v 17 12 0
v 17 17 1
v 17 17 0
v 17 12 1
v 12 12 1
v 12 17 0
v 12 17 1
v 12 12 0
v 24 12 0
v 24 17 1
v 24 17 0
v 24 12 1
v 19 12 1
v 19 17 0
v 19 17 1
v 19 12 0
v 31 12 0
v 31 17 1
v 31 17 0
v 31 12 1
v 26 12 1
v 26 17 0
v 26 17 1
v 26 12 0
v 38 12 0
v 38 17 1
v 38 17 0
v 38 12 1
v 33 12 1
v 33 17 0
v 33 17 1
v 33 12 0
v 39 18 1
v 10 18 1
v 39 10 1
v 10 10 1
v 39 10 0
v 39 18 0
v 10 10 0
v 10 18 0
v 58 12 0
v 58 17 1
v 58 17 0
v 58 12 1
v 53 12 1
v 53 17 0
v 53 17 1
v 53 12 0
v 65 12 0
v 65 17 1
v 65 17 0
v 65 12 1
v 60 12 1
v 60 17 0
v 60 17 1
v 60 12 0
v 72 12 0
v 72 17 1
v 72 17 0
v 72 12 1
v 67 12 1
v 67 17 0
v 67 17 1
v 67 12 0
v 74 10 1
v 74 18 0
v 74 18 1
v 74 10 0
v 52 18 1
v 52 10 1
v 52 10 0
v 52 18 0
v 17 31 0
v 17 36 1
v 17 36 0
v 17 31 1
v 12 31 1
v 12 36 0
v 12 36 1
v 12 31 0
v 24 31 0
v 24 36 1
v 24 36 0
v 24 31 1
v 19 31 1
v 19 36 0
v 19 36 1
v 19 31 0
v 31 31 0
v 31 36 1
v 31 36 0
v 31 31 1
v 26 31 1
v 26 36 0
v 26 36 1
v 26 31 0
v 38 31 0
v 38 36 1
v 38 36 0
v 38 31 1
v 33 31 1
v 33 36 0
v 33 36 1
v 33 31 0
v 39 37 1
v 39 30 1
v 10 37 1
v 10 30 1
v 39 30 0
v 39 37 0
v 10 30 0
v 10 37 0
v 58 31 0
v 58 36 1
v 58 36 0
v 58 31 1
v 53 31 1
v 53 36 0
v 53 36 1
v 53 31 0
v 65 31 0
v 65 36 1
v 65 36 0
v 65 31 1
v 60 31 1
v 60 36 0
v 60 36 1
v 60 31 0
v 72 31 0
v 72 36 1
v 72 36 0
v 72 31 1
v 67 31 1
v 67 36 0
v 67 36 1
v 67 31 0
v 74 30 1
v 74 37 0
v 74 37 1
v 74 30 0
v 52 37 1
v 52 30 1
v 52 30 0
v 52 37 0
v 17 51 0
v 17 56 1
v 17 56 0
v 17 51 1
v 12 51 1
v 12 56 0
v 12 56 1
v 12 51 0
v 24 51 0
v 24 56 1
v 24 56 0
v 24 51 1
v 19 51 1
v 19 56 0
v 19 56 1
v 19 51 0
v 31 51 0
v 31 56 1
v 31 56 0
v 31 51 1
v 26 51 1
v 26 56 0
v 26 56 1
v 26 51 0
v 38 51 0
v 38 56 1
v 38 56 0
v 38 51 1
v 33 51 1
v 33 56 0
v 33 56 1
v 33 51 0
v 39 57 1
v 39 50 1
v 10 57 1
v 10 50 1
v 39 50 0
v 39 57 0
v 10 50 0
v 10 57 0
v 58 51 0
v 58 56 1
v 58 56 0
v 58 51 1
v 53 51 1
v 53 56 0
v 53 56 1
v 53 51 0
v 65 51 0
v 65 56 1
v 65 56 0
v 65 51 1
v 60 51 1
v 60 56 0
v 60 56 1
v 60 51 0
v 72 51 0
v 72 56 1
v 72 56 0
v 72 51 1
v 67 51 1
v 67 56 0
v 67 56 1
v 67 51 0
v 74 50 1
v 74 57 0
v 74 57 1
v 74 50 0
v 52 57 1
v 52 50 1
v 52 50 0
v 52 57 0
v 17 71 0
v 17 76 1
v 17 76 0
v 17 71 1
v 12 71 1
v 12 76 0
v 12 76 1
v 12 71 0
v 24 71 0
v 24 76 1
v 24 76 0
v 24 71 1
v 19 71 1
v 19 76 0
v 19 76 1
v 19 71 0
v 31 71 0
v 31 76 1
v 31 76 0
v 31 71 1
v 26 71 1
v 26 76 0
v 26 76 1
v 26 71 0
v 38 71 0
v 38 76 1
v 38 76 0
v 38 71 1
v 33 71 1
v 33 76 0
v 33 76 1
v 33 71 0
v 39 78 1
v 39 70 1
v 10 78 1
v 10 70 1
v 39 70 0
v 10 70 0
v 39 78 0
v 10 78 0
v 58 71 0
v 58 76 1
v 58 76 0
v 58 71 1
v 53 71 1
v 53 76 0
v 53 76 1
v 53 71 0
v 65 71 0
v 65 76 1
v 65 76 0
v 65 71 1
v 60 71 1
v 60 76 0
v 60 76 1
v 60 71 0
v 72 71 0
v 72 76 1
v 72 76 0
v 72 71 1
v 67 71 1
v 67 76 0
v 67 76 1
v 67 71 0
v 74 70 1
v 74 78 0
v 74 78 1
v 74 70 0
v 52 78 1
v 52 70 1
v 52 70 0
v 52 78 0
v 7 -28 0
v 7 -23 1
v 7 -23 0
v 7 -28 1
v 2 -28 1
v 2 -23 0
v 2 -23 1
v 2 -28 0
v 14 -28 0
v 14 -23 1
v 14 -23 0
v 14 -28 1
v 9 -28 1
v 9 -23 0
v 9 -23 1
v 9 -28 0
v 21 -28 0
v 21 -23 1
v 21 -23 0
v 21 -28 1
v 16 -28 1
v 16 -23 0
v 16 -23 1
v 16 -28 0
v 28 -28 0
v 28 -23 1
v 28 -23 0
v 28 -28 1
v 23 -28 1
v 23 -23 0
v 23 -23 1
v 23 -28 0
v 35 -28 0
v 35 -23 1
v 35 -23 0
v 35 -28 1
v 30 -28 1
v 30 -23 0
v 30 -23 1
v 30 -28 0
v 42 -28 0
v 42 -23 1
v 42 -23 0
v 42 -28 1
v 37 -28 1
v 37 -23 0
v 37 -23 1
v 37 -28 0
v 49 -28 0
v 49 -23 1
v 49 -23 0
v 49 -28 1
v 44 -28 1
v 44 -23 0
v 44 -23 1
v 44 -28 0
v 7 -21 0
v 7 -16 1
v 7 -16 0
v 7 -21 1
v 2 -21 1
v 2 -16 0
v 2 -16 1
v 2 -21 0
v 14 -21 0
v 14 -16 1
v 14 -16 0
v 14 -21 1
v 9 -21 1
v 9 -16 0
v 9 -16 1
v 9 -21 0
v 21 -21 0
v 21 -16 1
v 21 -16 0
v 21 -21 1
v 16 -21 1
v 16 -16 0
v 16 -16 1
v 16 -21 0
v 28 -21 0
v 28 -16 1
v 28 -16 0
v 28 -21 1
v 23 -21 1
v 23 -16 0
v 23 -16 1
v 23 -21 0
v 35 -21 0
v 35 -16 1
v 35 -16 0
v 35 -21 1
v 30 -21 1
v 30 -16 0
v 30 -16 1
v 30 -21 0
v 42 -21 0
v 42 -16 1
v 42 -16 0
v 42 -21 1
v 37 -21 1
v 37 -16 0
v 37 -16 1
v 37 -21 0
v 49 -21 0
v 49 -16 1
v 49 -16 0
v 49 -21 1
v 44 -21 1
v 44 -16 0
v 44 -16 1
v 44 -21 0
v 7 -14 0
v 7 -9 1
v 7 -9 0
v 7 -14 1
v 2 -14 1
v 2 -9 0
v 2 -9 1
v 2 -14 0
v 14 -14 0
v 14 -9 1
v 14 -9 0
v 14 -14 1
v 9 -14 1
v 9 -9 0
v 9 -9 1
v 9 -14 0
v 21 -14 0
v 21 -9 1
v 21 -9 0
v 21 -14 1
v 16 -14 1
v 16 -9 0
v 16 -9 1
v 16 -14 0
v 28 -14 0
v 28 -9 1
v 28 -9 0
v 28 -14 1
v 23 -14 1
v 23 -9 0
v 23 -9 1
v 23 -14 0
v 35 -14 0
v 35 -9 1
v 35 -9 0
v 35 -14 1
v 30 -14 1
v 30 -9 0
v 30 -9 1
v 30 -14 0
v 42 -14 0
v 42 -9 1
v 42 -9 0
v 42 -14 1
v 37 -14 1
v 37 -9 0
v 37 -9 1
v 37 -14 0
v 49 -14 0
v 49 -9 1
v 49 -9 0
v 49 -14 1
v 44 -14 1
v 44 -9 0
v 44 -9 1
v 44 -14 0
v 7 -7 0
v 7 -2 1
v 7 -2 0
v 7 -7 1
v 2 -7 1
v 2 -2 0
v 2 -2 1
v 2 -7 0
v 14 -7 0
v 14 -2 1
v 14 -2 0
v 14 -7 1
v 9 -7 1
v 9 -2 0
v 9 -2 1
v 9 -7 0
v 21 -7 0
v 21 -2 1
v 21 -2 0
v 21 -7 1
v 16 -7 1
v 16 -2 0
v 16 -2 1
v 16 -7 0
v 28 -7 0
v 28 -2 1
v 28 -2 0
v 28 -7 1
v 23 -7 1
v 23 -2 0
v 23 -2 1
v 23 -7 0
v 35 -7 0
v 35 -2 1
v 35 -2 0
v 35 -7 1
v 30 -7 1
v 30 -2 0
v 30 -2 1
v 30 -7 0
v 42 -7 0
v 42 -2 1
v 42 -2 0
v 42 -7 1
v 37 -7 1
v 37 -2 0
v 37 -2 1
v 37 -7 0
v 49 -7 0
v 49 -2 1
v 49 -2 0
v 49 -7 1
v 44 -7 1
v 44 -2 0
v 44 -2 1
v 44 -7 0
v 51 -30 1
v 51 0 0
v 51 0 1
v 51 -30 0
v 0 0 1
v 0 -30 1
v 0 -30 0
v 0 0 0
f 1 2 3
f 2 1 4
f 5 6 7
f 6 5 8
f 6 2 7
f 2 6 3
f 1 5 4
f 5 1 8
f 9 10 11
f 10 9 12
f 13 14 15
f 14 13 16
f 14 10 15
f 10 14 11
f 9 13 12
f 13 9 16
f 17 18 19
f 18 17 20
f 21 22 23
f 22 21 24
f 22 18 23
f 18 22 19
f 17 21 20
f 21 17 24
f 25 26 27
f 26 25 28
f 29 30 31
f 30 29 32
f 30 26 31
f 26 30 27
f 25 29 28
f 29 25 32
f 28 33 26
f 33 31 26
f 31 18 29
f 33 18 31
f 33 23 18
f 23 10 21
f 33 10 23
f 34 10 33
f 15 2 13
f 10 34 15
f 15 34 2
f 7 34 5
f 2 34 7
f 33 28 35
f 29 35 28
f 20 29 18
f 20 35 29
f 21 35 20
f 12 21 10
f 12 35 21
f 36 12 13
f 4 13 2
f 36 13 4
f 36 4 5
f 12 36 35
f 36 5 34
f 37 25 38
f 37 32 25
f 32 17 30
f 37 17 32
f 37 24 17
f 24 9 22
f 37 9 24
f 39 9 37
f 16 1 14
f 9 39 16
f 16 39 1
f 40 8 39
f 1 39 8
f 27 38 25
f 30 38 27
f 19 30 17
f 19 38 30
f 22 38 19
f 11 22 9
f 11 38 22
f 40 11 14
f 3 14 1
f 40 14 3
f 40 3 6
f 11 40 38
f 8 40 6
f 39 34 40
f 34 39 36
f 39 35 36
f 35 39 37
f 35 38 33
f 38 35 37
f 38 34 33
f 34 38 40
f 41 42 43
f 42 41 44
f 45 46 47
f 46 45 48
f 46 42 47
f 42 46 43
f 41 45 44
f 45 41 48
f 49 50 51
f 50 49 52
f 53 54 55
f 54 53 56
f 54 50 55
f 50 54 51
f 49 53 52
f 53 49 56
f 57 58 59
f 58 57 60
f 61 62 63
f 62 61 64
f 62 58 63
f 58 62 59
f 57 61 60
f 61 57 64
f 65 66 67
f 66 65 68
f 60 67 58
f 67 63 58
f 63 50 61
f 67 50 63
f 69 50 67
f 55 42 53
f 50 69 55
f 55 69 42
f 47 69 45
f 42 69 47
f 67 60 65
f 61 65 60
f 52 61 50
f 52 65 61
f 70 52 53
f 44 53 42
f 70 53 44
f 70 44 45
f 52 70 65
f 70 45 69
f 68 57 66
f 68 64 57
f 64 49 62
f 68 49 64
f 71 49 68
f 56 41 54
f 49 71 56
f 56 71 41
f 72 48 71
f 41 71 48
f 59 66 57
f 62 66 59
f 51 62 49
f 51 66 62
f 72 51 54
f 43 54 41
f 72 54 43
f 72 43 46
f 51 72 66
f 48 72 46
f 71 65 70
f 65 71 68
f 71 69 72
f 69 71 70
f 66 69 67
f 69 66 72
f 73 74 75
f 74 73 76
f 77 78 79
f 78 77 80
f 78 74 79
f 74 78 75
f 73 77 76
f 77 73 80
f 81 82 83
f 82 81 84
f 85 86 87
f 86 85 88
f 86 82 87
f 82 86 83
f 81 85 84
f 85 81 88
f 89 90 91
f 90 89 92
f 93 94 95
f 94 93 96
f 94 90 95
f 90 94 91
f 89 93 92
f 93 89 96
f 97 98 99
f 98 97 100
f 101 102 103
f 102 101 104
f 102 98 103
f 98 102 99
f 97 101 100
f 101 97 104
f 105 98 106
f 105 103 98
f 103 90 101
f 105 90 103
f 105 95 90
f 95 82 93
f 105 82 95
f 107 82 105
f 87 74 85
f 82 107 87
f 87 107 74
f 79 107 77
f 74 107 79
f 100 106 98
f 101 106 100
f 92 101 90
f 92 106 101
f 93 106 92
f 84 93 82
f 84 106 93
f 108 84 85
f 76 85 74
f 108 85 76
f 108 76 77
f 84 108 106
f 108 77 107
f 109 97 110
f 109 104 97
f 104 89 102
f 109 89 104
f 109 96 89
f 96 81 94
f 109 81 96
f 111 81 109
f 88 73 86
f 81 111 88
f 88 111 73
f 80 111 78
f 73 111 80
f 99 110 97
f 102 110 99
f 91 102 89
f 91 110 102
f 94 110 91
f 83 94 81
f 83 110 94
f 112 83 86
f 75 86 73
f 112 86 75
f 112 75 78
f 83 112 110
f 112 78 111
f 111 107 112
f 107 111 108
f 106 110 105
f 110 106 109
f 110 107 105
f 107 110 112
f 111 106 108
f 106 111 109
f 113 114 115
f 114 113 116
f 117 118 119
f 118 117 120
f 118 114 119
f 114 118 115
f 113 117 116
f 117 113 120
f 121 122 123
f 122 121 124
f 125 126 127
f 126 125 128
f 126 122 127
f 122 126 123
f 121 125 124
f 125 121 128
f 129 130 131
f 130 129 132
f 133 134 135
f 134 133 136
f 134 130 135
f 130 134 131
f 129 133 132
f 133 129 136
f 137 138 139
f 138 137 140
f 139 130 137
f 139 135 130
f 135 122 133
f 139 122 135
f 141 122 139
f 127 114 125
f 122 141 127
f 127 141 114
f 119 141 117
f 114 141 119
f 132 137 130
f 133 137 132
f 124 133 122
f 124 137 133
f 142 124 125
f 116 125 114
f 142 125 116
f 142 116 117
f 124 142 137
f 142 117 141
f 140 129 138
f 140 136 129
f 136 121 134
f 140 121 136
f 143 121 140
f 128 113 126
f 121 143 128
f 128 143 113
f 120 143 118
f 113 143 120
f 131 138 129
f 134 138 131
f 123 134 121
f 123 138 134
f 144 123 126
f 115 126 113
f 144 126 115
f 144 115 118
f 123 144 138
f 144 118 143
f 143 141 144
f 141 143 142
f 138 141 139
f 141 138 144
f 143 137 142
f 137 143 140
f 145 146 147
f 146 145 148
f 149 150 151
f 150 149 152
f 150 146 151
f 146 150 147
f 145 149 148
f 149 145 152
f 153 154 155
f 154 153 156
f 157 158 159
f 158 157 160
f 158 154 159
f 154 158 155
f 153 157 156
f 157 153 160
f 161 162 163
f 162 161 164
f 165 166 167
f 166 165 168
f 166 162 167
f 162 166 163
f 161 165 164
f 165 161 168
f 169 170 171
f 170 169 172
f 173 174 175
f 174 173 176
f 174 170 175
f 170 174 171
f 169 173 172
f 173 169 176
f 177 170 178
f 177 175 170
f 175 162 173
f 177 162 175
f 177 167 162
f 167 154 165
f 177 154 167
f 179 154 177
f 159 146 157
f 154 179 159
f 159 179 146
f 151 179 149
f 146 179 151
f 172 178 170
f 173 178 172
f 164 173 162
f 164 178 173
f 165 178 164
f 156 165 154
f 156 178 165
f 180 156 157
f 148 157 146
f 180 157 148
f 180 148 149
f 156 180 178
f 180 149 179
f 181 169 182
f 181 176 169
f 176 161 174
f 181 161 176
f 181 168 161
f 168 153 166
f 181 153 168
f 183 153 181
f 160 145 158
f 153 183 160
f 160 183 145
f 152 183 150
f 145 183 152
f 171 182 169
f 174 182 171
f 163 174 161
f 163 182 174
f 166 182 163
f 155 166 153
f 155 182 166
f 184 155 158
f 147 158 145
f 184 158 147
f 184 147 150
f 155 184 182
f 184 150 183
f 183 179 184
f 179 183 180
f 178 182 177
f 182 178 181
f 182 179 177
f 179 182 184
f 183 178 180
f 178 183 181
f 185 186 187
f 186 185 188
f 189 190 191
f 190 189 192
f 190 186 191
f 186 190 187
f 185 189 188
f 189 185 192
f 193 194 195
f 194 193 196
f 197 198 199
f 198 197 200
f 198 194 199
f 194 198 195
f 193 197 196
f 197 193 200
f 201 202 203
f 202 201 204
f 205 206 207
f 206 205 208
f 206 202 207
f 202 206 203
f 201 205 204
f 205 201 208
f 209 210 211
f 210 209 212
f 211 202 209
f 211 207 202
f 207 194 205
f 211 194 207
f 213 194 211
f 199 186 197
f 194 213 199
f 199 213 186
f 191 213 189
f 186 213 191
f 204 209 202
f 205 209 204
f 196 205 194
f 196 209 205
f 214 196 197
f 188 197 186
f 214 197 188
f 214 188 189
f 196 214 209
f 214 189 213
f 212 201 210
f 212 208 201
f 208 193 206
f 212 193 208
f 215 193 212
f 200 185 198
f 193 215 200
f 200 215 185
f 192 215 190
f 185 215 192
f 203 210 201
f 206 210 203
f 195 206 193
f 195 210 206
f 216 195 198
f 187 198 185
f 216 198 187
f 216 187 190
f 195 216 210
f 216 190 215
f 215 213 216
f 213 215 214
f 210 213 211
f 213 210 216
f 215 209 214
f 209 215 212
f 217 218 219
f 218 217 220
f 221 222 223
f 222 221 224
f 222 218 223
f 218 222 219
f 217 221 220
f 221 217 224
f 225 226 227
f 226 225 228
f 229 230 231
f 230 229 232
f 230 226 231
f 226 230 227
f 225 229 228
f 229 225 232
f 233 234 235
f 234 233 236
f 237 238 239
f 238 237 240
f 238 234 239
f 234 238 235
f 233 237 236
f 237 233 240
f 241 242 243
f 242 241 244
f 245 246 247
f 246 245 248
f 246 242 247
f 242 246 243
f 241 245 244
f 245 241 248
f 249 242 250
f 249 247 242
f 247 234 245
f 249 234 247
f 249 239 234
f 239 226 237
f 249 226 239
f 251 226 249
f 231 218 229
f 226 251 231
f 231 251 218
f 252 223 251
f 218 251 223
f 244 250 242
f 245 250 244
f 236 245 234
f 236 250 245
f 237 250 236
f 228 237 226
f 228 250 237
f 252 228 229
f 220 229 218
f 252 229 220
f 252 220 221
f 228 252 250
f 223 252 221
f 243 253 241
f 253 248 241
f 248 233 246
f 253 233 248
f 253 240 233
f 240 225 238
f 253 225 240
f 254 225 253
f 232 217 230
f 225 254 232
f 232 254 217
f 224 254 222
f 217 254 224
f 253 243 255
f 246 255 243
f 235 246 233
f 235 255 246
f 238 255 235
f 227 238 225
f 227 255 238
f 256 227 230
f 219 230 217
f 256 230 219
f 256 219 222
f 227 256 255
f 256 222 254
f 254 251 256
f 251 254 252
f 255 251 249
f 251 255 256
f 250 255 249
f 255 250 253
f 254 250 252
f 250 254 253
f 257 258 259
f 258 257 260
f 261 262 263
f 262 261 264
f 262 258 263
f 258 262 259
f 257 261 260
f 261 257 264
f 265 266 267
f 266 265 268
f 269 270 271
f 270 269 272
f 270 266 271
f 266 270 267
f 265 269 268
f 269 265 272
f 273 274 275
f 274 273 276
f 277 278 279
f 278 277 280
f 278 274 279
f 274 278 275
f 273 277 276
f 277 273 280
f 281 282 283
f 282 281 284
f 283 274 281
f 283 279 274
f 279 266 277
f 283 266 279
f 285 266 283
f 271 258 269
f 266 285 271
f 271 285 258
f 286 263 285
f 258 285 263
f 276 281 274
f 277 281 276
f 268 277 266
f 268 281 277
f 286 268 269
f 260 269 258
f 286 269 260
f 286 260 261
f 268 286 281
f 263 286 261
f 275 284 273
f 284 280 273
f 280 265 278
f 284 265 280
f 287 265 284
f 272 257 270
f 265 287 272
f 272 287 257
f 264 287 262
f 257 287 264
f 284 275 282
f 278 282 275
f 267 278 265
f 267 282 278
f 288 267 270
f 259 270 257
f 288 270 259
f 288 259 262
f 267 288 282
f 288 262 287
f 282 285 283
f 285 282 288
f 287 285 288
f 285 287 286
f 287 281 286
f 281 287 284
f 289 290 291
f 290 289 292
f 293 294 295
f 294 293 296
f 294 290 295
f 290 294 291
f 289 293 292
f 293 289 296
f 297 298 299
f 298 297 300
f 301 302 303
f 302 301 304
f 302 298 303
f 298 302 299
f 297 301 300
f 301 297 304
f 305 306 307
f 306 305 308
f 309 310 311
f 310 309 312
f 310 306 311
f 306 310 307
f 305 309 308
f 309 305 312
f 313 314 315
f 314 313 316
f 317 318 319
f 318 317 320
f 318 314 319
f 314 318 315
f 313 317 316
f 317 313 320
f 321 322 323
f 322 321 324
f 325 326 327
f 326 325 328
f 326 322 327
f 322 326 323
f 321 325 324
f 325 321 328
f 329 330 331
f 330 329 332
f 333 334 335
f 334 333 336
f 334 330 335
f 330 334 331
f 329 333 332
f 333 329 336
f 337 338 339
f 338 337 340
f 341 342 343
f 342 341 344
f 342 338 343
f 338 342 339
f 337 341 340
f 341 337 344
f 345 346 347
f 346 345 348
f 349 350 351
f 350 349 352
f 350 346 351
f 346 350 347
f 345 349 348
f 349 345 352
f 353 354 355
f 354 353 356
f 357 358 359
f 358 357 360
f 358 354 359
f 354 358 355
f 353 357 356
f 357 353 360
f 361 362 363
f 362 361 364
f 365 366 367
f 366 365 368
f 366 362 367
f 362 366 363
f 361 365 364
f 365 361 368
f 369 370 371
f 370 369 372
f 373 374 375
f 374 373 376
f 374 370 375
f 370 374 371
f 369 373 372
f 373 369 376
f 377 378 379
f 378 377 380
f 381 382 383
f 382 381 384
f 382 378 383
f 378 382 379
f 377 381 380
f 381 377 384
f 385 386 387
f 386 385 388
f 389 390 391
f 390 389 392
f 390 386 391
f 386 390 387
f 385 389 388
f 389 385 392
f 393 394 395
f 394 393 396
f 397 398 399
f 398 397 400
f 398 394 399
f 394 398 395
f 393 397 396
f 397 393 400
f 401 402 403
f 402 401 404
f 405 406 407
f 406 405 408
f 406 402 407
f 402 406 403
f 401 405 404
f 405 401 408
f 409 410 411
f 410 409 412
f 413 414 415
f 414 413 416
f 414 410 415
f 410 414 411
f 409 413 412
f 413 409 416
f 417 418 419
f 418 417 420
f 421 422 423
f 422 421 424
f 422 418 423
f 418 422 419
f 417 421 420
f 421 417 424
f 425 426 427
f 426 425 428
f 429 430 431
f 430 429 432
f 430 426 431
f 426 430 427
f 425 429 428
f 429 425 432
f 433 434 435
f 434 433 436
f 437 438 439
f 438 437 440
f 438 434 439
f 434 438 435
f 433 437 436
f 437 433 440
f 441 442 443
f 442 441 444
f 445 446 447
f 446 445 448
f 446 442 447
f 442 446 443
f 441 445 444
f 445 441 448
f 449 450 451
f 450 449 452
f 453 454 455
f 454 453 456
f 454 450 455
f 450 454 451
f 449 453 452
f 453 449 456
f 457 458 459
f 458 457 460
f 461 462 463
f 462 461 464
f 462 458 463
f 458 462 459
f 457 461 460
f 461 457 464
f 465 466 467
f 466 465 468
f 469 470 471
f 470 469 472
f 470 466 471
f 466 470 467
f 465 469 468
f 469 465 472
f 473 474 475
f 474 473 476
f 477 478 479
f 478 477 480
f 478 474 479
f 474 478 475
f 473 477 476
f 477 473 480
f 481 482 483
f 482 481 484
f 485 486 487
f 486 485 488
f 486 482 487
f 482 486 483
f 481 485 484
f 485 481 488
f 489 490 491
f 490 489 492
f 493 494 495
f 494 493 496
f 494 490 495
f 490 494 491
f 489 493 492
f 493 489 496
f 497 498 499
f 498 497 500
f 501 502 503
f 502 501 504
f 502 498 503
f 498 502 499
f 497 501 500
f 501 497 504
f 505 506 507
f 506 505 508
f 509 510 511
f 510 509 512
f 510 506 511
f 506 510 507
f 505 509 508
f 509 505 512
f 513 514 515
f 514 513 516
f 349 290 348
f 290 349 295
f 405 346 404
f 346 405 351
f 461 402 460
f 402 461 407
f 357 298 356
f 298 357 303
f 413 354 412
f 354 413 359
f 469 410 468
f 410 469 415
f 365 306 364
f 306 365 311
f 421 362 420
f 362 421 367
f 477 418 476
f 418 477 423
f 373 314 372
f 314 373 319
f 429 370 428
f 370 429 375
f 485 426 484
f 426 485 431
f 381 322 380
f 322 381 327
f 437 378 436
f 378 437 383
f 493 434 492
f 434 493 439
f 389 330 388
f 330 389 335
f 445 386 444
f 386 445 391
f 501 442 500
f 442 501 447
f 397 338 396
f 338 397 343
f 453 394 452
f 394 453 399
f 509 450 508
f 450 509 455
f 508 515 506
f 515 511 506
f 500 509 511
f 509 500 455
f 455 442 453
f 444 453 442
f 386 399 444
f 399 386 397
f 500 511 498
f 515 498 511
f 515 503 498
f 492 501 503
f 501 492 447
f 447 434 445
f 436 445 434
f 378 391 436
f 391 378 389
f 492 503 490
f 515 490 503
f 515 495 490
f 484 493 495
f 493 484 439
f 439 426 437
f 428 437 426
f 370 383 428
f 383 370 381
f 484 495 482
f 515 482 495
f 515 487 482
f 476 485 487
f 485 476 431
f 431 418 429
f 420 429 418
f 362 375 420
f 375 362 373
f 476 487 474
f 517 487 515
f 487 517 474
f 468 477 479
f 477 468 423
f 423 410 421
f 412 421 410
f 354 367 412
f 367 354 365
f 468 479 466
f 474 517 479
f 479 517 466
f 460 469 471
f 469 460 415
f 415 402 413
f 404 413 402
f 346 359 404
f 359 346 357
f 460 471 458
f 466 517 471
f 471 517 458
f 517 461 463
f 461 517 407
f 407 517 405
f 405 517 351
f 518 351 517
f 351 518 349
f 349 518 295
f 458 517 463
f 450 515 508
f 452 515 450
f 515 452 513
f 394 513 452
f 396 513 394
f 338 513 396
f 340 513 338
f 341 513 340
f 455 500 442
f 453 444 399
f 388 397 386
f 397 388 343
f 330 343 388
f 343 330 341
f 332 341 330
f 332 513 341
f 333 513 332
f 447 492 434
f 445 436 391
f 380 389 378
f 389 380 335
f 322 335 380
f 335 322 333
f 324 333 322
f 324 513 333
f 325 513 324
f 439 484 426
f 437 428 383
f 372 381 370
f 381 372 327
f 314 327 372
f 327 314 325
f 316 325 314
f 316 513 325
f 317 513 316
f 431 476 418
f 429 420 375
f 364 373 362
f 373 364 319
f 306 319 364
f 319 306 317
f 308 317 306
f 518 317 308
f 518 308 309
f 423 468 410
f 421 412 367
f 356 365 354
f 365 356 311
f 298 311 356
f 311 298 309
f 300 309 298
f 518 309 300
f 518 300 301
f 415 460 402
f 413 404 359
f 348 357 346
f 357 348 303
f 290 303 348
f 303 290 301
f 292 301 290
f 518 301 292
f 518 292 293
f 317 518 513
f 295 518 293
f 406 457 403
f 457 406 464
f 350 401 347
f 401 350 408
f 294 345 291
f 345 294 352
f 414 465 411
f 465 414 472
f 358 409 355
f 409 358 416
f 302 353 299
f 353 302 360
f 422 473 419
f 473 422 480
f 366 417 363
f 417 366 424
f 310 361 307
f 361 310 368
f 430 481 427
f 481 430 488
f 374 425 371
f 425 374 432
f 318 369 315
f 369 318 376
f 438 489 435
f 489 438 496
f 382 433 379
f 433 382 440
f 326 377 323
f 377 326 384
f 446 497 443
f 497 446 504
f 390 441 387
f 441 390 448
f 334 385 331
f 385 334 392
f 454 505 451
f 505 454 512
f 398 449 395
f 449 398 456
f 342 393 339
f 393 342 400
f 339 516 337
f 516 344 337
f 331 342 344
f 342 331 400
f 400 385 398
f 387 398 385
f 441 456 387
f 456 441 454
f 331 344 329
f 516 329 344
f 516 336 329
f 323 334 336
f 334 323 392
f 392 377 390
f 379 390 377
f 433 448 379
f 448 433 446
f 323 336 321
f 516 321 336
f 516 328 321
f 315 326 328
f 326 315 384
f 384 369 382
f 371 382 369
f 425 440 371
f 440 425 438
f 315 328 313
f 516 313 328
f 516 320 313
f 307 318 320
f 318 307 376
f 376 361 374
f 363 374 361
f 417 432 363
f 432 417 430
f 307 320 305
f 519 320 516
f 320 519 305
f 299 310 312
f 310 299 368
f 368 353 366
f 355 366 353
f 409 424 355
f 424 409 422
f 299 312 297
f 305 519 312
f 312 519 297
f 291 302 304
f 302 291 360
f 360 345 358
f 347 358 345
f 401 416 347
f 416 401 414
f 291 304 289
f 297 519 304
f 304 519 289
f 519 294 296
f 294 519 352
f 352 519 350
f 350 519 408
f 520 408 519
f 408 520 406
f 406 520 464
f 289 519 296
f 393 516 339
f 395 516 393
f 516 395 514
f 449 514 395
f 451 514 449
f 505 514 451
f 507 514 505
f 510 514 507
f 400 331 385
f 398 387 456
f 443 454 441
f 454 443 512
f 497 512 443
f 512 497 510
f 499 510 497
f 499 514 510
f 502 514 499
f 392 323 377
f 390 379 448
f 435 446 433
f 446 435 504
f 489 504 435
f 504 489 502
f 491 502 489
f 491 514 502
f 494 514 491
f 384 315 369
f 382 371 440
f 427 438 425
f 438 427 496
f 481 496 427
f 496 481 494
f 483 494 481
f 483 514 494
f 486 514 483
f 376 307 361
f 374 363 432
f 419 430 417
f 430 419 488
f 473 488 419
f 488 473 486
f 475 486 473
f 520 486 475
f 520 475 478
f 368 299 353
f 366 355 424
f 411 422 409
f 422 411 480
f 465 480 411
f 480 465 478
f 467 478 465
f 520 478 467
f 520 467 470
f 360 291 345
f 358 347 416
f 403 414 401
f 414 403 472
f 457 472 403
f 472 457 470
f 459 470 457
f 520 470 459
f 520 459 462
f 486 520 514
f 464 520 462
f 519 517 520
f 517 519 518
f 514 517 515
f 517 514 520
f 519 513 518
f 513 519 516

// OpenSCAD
// file: paginate.scad
module paginate(bounds, page, snap=[0,0,0], first_page_offset=[0, 0, 0], spacing=[10,10,10]) {
  echo(bounds);
  echo(page);
  echo(snap);
  echo(first_page_offset);
  echo(spacing);

  page_offset = page - first_page_offset * 2;
  crop = [bounds[0] > page_offset[0] ? (page_offset[0] - (page_offset[0] % snap[0])) : page[0],
          bounds[1] > page_offset[1] ? (page_offset[1] - (page_offset[1] % snap[1])) : page[1],
          page[2]];

  page_bounds = bounds - first_page_offset * 2;

  pages = [
           max(1, ceil(page_bounds[0]/crop[0])),
           max(1, ceil(page_bounds[1]/crop[1])),
           1 /* only 2D paging for now */
           ];

    echo("Crop: ", crop);
    echo("Pages: ", pages);
    for (page_y = [ 0 : 1 : pages[1] - 1] ) {
      for (page_x = [ 0 : 1 : pages[0] - 1] ) {
        page_offset_x = page_x * crop[0];
        page_offset_y = page_y * crop[1];

        translate([
          spacing[0]  + (spacing[0] + page[0]) * page_x,
          spacing[1]  + (spacing[1] + page[1]) * page_y,
          0
        ]) {
          translate([-page_offset_x, -page_offset_y, 0])
          intersection() {
            translate([page_offset_x, page_offset_y, 0])
              cube(crop + [
                  page_x == 0 ? first_page_offset[0] : 0,
                  page_y == 0 ? first_page_offset[1] : 0,
                  0
                ] + [
                  page_x >= (pages[0] - 1) ? page[0] - crop[0] : 0,
                  page_y >= (pages[1] - 1) ? page[1] - crop[1] : 0,
                  0
                ]);
              translate([
                page_x > 0 ? -first_page_offset[0] : 0,
                page_y > 0 ? -first_page_offset[1] : 0,
                0])
                render()
                  children();
          }

%       translate([0, 0, -page[2] - 0.1])
          color("red", alpha=0.2)
            cube(page);
        }
      }
    }
}
// main file
use <paginate.scad>

// A demo of paginate.scad

// The stock material (aka the page size)
stock = [32, 10, 1];

// The full size of the object to be paginated
test = [51, 30, stock[2]];

// Spacing between the holes
test_spacing = [7, 7, 10];

// The size of the holes
hole_size = [5, 5, test[2]];

paginate(test, stock, snap=test_spacing,
         first_page_offset=[
           (test_spacing[0] - hole_size[0])/2,
           (test_spacing[1] - hole_size[1])/2,
           0]
        ) {
  grid(test, test_spacing, hole_size);
}

// Here's what the grid looks like non-paginated
translate([0, -30, 0])
  grid(test, test_spacing, hole_size);

// A grid of holes with a border
module grid(dim, spacing, hole_size) {
  difference() {
    cube(dim);

    for (y = [ spacing[1] - hole_size[1]: spacing[1] : dim[1] - dim[1] % spacing[1] ]) {
      for (x = [ spacing[0] - hole_size[0] : spacing[0] : dim[0] - dim[0] % spacing[0] ]) {
        translate([x, y, -1])
          cube(hole_size + [0, 0, 2]);
      }
    }
  }
}
